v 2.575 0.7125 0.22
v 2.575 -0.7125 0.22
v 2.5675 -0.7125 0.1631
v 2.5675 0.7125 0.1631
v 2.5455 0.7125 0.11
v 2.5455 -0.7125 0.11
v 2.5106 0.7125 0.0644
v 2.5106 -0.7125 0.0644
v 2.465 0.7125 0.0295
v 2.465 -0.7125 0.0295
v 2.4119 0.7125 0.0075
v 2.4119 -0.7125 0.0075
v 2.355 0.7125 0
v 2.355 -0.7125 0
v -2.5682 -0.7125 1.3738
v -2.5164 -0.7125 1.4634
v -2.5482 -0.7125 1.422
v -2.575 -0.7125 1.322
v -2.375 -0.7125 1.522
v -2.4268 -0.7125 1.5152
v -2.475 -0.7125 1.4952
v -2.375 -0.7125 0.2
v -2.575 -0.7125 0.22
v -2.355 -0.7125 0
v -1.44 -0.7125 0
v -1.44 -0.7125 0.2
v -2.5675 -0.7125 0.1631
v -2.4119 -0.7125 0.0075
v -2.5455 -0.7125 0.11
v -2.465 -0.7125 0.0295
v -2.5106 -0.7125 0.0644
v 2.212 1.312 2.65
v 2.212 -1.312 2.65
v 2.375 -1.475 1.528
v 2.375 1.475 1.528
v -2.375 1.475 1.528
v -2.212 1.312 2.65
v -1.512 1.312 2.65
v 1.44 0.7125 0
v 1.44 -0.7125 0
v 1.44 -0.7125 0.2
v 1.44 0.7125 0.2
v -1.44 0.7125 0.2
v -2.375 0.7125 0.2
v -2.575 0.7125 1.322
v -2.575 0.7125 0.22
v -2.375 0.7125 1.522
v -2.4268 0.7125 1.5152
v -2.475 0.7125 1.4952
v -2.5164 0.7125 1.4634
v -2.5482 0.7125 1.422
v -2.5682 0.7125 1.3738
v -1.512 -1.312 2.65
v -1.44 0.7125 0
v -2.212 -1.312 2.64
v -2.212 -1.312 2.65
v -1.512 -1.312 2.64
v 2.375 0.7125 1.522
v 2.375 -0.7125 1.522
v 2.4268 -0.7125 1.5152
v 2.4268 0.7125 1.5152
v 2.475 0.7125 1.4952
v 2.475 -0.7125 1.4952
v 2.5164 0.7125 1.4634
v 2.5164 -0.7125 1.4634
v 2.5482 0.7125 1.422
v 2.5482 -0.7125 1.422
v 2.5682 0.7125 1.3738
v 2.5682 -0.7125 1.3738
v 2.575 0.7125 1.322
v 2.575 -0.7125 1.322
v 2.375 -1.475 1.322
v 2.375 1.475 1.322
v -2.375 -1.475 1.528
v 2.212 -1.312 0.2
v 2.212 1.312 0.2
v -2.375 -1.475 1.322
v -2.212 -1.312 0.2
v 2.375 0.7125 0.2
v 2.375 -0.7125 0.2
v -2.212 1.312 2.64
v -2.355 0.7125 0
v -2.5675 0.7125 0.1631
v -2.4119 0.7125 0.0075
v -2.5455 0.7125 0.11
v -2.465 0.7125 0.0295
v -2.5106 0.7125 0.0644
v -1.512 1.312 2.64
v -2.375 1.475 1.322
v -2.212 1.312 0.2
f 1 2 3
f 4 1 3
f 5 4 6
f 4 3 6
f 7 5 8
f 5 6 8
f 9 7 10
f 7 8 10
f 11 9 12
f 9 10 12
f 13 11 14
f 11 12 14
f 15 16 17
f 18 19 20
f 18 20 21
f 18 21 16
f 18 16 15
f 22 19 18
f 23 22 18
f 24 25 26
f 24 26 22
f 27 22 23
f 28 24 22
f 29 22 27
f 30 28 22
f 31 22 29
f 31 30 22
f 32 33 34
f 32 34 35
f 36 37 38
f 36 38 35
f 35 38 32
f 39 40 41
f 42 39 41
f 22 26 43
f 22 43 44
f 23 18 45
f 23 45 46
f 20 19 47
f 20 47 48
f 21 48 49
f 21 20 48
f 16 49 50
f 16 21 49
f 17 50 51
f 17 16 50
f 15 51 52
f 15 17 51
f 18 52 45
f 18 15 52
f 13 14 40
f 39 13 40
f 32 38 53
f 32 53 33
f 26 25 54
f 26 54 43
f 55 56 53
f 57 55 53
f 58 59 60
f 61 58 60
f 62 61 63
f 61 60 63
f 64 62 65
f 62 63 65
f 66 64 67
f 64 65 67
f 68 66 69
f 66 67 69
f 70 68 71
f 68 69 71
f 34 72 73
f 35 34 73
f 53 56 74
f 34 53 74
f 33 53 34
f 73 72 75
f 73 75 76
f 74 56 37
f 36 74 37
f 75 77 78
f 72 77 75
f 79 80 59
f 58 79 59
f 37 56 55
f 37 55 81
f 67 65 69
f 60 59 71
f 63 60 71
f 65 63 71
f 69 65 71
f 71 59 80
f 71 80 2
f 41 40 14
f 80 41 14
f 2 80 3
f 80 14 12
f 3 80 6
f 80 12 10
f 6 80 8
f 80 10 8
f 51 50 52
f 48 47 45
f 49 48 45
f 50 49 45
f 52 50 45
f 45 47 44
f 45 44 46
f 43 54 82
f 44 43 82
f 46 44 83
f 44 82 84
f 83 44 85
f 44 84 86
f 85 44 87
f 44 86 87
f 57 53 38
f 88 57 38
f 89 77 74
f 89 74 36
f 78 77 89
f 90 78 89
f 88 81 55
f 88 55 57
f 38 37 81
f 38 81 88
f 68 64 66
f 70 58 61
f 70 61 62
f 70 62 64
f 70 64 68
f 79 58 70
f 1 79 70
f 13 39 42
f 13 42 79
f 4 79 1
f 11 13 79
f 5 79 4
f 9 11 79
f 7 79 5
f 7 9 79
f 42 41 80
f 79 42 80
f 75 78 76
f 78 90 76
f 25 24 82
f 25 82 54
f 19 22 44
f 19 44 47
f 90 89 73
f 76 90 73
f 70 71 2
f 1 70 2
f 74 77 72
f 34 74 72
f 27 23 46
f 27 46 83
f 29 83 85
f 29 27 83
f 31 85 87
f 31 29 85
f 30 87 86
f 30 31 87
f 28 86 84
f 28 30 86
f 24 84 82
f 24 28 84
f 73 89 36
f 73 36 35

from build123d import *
from OCP.BRepFilletAPI import BRepFilletAPI_MakeChamfer

# Parameters (mm, degrees)
SKETCH_1_W           = 4.75
SKETCH_1_H           = 2.95
EXTRUDE_1_DEPTH      = 2.45
CHAMFER_1_SIZE       = 1.122
CHAMFER_1_SIZE2      = 0.163
CHAMFER_2_SIZE       = 0.163
CHAMFER_2_SIZE2      = 1.122
EXTRUDE_2_DEPTH      = 0.7125
EXTRUDE_2_DEPTH_BACK = 0.7125
SKETCH_3_W           = 0.7
SKETCH_3_H           = 2.624
CUT_EXTRUDE_1_DEPTH  = 0.01


with BuildPart() as part:
    # Эскиз1 → Бобышка-Вытянуть1 (new body)
    with BuildSketch(Plane.XY.offset(0.2)):
        Rectangle(SKETCH_1_W, SKETCH_1_H)
    extrude(amount=EXTRUDE_1_DEPTH)

    # Фаска1: one chamfer whose edges measure the first distance from different faces: ONE call of the kernel's chamfer builder (chamfer() names one face for all edges)
    chamfer_1_edges_1 = [part.edges().sort_by_distance(p)[0] for p in [
        (-2.375, 0, 2.65),
    ]]
    chamfer_1_side_1 = [part.faces().sort_by_distance(p)[0] for p in [
        (-2.375, 0, 1.425),
    ]]
    chamfer_1_edges_2 = [part.edges().sort_by_distance(p)[0] for p in [
        (0, -1.475, 2.65),
    ]]
    chamfer_1_side_2 = [part.faces().sort_by_distance(p)[0] for p in [
        (0, -1.475, 1.425),
    ]]
    chamfer_1_edges_3 = [part.edges().sort_by_distance(p)[0] for p in [
        (2.375, 0, 2.65),
    ]]
    chamfer_1_side_3 = [part.faces().sort_by_distance(p)[0] for p in [
        (2.375, 0, 1.425),
    ]]
    chamfer_1_edges_4 = [part.edges().sort_by_distance(p)[0] for p in [
        (0, 1.475, 2.65),
    ]]
    chamfer_1_side_4 = [part.faces().sort_by_distance(p)[0] for p in [
        (0, 1.475, 1.425),
    ]]
    chamfer_1 = BRepFilletAPI_MakeChamfer(part.part.solid().wrapped)
    for e in chamfer_1_edges_1:
        chamfer_1.Add(CHAMFER_1_SIZE, CHAMFER_1_SIZE2, e.wrapped, chamfer_1_side_1[0].wrapped)  # the first distance lies on this face
    for e in chamfer_1_edges_2:
        chamfer_1.Add(CHAMFER_1_SIZE, CHAMFER_1_SIZE2, e.wrapped, chamfer_1_side_2[0].wrapped)  # the first distance lies on this face
    for e in chamfer_1_edges_3:
        chamfer_1.Add(CHAMFER_1_SIZE, CHAMFER_1_SIZE2, e.wrapped, chamfer_1_side_3[0].wrapped)  # the first distance lies on this face
    for e in chamfer_1_edges_4:
        chamfer_1.Add(CHAMFER_1_SIZE, CHAMFER_1_SIZE2, e.wrapped, chamfer_1_side_4[0].wrapped)  # the first distance lies on this face
    add(Compound.cast(chamfer_1.Shape()), mode=Mode.REPLACE)

    # Фаска2
    chamfer_2_edges = [part.edges().sort_by_distance(p)[0] for p in [
        (0, -1.475, 0.2),
        (-2.375, 0, 0.2),
        (0, 1.475, 0.2),
        (2.375, 0, 0.2),
    ]]
    chamfer_2_side = [part.faces().sort_by_distance(p)[0] for p in [
        (0, 0, 0.2),
    ]]
    chamfer(chamfer_2_edges, length=CHAMFER_2_SIZE, length2=CHAMFER_2_SIZE2, reference=chamfer_2_side[0])

    # Эскиз3 → Вырез-Вытянуть1 (cut)
    with BuildSketch(Plane.XY.offset(2.65)):
        with Locations((-1.862, 0)):
            Rectangle(SKETCH_3_W, SKETCH_3_H)
    extrude(amount=-CUT_EXTRUDE_1_DEPTH, mode=Mode.SUBTRACT)


with BuildPart() as body_2:
    # Эскиз2 → Бобышка-Вытянуть2 (new, two sides: drawn at the far end of the back side and taken through both)
    with BuildSketch(Plane(origin=(0, 0, 0), x_dir=(1, 0, 0), z_dir=(0, 1, 0)).offset(-EXTRUDE_2_DEPTH_BACK)):
        with BuildLine():
            Line((-2.375, -0.2), (-2.375, -1.322))
            Line((-2.375, -1.322), (-2.375, -1.522))
            ThreePointArc((-2.375, -1.522), (-2.516421356, -1.463421356), (-2.575, -1.322))
            Line((-2.575, -1.322), (-2.575, -0.22))
            ThreePointArc((-2.575, -0.22), (-2.510563492, -0.064436508), (-2.355, 0))
            Line((-2.355, 0), (-1.44, 0))
            Line((-1.44, 0), (-1.44, -0.2))
            Line((-1.44, -0.2), (-2.375, -0.2))
        make_face()
    extrude(amount=EXTRUDE_2_DEPTH + EXTRUDE_2_DEPTH_BACK)


with BuildPart() as body_3:
    # Зеркальное отражение1: mirrored copy
    add(body_2.part.mirror(Plane(origin=(0, 0, 0), x_dir=(0, 0, 1), z_dir=(1, 0, 0))))


solid = Compound([part.part, body_2.part, body_3.part])
